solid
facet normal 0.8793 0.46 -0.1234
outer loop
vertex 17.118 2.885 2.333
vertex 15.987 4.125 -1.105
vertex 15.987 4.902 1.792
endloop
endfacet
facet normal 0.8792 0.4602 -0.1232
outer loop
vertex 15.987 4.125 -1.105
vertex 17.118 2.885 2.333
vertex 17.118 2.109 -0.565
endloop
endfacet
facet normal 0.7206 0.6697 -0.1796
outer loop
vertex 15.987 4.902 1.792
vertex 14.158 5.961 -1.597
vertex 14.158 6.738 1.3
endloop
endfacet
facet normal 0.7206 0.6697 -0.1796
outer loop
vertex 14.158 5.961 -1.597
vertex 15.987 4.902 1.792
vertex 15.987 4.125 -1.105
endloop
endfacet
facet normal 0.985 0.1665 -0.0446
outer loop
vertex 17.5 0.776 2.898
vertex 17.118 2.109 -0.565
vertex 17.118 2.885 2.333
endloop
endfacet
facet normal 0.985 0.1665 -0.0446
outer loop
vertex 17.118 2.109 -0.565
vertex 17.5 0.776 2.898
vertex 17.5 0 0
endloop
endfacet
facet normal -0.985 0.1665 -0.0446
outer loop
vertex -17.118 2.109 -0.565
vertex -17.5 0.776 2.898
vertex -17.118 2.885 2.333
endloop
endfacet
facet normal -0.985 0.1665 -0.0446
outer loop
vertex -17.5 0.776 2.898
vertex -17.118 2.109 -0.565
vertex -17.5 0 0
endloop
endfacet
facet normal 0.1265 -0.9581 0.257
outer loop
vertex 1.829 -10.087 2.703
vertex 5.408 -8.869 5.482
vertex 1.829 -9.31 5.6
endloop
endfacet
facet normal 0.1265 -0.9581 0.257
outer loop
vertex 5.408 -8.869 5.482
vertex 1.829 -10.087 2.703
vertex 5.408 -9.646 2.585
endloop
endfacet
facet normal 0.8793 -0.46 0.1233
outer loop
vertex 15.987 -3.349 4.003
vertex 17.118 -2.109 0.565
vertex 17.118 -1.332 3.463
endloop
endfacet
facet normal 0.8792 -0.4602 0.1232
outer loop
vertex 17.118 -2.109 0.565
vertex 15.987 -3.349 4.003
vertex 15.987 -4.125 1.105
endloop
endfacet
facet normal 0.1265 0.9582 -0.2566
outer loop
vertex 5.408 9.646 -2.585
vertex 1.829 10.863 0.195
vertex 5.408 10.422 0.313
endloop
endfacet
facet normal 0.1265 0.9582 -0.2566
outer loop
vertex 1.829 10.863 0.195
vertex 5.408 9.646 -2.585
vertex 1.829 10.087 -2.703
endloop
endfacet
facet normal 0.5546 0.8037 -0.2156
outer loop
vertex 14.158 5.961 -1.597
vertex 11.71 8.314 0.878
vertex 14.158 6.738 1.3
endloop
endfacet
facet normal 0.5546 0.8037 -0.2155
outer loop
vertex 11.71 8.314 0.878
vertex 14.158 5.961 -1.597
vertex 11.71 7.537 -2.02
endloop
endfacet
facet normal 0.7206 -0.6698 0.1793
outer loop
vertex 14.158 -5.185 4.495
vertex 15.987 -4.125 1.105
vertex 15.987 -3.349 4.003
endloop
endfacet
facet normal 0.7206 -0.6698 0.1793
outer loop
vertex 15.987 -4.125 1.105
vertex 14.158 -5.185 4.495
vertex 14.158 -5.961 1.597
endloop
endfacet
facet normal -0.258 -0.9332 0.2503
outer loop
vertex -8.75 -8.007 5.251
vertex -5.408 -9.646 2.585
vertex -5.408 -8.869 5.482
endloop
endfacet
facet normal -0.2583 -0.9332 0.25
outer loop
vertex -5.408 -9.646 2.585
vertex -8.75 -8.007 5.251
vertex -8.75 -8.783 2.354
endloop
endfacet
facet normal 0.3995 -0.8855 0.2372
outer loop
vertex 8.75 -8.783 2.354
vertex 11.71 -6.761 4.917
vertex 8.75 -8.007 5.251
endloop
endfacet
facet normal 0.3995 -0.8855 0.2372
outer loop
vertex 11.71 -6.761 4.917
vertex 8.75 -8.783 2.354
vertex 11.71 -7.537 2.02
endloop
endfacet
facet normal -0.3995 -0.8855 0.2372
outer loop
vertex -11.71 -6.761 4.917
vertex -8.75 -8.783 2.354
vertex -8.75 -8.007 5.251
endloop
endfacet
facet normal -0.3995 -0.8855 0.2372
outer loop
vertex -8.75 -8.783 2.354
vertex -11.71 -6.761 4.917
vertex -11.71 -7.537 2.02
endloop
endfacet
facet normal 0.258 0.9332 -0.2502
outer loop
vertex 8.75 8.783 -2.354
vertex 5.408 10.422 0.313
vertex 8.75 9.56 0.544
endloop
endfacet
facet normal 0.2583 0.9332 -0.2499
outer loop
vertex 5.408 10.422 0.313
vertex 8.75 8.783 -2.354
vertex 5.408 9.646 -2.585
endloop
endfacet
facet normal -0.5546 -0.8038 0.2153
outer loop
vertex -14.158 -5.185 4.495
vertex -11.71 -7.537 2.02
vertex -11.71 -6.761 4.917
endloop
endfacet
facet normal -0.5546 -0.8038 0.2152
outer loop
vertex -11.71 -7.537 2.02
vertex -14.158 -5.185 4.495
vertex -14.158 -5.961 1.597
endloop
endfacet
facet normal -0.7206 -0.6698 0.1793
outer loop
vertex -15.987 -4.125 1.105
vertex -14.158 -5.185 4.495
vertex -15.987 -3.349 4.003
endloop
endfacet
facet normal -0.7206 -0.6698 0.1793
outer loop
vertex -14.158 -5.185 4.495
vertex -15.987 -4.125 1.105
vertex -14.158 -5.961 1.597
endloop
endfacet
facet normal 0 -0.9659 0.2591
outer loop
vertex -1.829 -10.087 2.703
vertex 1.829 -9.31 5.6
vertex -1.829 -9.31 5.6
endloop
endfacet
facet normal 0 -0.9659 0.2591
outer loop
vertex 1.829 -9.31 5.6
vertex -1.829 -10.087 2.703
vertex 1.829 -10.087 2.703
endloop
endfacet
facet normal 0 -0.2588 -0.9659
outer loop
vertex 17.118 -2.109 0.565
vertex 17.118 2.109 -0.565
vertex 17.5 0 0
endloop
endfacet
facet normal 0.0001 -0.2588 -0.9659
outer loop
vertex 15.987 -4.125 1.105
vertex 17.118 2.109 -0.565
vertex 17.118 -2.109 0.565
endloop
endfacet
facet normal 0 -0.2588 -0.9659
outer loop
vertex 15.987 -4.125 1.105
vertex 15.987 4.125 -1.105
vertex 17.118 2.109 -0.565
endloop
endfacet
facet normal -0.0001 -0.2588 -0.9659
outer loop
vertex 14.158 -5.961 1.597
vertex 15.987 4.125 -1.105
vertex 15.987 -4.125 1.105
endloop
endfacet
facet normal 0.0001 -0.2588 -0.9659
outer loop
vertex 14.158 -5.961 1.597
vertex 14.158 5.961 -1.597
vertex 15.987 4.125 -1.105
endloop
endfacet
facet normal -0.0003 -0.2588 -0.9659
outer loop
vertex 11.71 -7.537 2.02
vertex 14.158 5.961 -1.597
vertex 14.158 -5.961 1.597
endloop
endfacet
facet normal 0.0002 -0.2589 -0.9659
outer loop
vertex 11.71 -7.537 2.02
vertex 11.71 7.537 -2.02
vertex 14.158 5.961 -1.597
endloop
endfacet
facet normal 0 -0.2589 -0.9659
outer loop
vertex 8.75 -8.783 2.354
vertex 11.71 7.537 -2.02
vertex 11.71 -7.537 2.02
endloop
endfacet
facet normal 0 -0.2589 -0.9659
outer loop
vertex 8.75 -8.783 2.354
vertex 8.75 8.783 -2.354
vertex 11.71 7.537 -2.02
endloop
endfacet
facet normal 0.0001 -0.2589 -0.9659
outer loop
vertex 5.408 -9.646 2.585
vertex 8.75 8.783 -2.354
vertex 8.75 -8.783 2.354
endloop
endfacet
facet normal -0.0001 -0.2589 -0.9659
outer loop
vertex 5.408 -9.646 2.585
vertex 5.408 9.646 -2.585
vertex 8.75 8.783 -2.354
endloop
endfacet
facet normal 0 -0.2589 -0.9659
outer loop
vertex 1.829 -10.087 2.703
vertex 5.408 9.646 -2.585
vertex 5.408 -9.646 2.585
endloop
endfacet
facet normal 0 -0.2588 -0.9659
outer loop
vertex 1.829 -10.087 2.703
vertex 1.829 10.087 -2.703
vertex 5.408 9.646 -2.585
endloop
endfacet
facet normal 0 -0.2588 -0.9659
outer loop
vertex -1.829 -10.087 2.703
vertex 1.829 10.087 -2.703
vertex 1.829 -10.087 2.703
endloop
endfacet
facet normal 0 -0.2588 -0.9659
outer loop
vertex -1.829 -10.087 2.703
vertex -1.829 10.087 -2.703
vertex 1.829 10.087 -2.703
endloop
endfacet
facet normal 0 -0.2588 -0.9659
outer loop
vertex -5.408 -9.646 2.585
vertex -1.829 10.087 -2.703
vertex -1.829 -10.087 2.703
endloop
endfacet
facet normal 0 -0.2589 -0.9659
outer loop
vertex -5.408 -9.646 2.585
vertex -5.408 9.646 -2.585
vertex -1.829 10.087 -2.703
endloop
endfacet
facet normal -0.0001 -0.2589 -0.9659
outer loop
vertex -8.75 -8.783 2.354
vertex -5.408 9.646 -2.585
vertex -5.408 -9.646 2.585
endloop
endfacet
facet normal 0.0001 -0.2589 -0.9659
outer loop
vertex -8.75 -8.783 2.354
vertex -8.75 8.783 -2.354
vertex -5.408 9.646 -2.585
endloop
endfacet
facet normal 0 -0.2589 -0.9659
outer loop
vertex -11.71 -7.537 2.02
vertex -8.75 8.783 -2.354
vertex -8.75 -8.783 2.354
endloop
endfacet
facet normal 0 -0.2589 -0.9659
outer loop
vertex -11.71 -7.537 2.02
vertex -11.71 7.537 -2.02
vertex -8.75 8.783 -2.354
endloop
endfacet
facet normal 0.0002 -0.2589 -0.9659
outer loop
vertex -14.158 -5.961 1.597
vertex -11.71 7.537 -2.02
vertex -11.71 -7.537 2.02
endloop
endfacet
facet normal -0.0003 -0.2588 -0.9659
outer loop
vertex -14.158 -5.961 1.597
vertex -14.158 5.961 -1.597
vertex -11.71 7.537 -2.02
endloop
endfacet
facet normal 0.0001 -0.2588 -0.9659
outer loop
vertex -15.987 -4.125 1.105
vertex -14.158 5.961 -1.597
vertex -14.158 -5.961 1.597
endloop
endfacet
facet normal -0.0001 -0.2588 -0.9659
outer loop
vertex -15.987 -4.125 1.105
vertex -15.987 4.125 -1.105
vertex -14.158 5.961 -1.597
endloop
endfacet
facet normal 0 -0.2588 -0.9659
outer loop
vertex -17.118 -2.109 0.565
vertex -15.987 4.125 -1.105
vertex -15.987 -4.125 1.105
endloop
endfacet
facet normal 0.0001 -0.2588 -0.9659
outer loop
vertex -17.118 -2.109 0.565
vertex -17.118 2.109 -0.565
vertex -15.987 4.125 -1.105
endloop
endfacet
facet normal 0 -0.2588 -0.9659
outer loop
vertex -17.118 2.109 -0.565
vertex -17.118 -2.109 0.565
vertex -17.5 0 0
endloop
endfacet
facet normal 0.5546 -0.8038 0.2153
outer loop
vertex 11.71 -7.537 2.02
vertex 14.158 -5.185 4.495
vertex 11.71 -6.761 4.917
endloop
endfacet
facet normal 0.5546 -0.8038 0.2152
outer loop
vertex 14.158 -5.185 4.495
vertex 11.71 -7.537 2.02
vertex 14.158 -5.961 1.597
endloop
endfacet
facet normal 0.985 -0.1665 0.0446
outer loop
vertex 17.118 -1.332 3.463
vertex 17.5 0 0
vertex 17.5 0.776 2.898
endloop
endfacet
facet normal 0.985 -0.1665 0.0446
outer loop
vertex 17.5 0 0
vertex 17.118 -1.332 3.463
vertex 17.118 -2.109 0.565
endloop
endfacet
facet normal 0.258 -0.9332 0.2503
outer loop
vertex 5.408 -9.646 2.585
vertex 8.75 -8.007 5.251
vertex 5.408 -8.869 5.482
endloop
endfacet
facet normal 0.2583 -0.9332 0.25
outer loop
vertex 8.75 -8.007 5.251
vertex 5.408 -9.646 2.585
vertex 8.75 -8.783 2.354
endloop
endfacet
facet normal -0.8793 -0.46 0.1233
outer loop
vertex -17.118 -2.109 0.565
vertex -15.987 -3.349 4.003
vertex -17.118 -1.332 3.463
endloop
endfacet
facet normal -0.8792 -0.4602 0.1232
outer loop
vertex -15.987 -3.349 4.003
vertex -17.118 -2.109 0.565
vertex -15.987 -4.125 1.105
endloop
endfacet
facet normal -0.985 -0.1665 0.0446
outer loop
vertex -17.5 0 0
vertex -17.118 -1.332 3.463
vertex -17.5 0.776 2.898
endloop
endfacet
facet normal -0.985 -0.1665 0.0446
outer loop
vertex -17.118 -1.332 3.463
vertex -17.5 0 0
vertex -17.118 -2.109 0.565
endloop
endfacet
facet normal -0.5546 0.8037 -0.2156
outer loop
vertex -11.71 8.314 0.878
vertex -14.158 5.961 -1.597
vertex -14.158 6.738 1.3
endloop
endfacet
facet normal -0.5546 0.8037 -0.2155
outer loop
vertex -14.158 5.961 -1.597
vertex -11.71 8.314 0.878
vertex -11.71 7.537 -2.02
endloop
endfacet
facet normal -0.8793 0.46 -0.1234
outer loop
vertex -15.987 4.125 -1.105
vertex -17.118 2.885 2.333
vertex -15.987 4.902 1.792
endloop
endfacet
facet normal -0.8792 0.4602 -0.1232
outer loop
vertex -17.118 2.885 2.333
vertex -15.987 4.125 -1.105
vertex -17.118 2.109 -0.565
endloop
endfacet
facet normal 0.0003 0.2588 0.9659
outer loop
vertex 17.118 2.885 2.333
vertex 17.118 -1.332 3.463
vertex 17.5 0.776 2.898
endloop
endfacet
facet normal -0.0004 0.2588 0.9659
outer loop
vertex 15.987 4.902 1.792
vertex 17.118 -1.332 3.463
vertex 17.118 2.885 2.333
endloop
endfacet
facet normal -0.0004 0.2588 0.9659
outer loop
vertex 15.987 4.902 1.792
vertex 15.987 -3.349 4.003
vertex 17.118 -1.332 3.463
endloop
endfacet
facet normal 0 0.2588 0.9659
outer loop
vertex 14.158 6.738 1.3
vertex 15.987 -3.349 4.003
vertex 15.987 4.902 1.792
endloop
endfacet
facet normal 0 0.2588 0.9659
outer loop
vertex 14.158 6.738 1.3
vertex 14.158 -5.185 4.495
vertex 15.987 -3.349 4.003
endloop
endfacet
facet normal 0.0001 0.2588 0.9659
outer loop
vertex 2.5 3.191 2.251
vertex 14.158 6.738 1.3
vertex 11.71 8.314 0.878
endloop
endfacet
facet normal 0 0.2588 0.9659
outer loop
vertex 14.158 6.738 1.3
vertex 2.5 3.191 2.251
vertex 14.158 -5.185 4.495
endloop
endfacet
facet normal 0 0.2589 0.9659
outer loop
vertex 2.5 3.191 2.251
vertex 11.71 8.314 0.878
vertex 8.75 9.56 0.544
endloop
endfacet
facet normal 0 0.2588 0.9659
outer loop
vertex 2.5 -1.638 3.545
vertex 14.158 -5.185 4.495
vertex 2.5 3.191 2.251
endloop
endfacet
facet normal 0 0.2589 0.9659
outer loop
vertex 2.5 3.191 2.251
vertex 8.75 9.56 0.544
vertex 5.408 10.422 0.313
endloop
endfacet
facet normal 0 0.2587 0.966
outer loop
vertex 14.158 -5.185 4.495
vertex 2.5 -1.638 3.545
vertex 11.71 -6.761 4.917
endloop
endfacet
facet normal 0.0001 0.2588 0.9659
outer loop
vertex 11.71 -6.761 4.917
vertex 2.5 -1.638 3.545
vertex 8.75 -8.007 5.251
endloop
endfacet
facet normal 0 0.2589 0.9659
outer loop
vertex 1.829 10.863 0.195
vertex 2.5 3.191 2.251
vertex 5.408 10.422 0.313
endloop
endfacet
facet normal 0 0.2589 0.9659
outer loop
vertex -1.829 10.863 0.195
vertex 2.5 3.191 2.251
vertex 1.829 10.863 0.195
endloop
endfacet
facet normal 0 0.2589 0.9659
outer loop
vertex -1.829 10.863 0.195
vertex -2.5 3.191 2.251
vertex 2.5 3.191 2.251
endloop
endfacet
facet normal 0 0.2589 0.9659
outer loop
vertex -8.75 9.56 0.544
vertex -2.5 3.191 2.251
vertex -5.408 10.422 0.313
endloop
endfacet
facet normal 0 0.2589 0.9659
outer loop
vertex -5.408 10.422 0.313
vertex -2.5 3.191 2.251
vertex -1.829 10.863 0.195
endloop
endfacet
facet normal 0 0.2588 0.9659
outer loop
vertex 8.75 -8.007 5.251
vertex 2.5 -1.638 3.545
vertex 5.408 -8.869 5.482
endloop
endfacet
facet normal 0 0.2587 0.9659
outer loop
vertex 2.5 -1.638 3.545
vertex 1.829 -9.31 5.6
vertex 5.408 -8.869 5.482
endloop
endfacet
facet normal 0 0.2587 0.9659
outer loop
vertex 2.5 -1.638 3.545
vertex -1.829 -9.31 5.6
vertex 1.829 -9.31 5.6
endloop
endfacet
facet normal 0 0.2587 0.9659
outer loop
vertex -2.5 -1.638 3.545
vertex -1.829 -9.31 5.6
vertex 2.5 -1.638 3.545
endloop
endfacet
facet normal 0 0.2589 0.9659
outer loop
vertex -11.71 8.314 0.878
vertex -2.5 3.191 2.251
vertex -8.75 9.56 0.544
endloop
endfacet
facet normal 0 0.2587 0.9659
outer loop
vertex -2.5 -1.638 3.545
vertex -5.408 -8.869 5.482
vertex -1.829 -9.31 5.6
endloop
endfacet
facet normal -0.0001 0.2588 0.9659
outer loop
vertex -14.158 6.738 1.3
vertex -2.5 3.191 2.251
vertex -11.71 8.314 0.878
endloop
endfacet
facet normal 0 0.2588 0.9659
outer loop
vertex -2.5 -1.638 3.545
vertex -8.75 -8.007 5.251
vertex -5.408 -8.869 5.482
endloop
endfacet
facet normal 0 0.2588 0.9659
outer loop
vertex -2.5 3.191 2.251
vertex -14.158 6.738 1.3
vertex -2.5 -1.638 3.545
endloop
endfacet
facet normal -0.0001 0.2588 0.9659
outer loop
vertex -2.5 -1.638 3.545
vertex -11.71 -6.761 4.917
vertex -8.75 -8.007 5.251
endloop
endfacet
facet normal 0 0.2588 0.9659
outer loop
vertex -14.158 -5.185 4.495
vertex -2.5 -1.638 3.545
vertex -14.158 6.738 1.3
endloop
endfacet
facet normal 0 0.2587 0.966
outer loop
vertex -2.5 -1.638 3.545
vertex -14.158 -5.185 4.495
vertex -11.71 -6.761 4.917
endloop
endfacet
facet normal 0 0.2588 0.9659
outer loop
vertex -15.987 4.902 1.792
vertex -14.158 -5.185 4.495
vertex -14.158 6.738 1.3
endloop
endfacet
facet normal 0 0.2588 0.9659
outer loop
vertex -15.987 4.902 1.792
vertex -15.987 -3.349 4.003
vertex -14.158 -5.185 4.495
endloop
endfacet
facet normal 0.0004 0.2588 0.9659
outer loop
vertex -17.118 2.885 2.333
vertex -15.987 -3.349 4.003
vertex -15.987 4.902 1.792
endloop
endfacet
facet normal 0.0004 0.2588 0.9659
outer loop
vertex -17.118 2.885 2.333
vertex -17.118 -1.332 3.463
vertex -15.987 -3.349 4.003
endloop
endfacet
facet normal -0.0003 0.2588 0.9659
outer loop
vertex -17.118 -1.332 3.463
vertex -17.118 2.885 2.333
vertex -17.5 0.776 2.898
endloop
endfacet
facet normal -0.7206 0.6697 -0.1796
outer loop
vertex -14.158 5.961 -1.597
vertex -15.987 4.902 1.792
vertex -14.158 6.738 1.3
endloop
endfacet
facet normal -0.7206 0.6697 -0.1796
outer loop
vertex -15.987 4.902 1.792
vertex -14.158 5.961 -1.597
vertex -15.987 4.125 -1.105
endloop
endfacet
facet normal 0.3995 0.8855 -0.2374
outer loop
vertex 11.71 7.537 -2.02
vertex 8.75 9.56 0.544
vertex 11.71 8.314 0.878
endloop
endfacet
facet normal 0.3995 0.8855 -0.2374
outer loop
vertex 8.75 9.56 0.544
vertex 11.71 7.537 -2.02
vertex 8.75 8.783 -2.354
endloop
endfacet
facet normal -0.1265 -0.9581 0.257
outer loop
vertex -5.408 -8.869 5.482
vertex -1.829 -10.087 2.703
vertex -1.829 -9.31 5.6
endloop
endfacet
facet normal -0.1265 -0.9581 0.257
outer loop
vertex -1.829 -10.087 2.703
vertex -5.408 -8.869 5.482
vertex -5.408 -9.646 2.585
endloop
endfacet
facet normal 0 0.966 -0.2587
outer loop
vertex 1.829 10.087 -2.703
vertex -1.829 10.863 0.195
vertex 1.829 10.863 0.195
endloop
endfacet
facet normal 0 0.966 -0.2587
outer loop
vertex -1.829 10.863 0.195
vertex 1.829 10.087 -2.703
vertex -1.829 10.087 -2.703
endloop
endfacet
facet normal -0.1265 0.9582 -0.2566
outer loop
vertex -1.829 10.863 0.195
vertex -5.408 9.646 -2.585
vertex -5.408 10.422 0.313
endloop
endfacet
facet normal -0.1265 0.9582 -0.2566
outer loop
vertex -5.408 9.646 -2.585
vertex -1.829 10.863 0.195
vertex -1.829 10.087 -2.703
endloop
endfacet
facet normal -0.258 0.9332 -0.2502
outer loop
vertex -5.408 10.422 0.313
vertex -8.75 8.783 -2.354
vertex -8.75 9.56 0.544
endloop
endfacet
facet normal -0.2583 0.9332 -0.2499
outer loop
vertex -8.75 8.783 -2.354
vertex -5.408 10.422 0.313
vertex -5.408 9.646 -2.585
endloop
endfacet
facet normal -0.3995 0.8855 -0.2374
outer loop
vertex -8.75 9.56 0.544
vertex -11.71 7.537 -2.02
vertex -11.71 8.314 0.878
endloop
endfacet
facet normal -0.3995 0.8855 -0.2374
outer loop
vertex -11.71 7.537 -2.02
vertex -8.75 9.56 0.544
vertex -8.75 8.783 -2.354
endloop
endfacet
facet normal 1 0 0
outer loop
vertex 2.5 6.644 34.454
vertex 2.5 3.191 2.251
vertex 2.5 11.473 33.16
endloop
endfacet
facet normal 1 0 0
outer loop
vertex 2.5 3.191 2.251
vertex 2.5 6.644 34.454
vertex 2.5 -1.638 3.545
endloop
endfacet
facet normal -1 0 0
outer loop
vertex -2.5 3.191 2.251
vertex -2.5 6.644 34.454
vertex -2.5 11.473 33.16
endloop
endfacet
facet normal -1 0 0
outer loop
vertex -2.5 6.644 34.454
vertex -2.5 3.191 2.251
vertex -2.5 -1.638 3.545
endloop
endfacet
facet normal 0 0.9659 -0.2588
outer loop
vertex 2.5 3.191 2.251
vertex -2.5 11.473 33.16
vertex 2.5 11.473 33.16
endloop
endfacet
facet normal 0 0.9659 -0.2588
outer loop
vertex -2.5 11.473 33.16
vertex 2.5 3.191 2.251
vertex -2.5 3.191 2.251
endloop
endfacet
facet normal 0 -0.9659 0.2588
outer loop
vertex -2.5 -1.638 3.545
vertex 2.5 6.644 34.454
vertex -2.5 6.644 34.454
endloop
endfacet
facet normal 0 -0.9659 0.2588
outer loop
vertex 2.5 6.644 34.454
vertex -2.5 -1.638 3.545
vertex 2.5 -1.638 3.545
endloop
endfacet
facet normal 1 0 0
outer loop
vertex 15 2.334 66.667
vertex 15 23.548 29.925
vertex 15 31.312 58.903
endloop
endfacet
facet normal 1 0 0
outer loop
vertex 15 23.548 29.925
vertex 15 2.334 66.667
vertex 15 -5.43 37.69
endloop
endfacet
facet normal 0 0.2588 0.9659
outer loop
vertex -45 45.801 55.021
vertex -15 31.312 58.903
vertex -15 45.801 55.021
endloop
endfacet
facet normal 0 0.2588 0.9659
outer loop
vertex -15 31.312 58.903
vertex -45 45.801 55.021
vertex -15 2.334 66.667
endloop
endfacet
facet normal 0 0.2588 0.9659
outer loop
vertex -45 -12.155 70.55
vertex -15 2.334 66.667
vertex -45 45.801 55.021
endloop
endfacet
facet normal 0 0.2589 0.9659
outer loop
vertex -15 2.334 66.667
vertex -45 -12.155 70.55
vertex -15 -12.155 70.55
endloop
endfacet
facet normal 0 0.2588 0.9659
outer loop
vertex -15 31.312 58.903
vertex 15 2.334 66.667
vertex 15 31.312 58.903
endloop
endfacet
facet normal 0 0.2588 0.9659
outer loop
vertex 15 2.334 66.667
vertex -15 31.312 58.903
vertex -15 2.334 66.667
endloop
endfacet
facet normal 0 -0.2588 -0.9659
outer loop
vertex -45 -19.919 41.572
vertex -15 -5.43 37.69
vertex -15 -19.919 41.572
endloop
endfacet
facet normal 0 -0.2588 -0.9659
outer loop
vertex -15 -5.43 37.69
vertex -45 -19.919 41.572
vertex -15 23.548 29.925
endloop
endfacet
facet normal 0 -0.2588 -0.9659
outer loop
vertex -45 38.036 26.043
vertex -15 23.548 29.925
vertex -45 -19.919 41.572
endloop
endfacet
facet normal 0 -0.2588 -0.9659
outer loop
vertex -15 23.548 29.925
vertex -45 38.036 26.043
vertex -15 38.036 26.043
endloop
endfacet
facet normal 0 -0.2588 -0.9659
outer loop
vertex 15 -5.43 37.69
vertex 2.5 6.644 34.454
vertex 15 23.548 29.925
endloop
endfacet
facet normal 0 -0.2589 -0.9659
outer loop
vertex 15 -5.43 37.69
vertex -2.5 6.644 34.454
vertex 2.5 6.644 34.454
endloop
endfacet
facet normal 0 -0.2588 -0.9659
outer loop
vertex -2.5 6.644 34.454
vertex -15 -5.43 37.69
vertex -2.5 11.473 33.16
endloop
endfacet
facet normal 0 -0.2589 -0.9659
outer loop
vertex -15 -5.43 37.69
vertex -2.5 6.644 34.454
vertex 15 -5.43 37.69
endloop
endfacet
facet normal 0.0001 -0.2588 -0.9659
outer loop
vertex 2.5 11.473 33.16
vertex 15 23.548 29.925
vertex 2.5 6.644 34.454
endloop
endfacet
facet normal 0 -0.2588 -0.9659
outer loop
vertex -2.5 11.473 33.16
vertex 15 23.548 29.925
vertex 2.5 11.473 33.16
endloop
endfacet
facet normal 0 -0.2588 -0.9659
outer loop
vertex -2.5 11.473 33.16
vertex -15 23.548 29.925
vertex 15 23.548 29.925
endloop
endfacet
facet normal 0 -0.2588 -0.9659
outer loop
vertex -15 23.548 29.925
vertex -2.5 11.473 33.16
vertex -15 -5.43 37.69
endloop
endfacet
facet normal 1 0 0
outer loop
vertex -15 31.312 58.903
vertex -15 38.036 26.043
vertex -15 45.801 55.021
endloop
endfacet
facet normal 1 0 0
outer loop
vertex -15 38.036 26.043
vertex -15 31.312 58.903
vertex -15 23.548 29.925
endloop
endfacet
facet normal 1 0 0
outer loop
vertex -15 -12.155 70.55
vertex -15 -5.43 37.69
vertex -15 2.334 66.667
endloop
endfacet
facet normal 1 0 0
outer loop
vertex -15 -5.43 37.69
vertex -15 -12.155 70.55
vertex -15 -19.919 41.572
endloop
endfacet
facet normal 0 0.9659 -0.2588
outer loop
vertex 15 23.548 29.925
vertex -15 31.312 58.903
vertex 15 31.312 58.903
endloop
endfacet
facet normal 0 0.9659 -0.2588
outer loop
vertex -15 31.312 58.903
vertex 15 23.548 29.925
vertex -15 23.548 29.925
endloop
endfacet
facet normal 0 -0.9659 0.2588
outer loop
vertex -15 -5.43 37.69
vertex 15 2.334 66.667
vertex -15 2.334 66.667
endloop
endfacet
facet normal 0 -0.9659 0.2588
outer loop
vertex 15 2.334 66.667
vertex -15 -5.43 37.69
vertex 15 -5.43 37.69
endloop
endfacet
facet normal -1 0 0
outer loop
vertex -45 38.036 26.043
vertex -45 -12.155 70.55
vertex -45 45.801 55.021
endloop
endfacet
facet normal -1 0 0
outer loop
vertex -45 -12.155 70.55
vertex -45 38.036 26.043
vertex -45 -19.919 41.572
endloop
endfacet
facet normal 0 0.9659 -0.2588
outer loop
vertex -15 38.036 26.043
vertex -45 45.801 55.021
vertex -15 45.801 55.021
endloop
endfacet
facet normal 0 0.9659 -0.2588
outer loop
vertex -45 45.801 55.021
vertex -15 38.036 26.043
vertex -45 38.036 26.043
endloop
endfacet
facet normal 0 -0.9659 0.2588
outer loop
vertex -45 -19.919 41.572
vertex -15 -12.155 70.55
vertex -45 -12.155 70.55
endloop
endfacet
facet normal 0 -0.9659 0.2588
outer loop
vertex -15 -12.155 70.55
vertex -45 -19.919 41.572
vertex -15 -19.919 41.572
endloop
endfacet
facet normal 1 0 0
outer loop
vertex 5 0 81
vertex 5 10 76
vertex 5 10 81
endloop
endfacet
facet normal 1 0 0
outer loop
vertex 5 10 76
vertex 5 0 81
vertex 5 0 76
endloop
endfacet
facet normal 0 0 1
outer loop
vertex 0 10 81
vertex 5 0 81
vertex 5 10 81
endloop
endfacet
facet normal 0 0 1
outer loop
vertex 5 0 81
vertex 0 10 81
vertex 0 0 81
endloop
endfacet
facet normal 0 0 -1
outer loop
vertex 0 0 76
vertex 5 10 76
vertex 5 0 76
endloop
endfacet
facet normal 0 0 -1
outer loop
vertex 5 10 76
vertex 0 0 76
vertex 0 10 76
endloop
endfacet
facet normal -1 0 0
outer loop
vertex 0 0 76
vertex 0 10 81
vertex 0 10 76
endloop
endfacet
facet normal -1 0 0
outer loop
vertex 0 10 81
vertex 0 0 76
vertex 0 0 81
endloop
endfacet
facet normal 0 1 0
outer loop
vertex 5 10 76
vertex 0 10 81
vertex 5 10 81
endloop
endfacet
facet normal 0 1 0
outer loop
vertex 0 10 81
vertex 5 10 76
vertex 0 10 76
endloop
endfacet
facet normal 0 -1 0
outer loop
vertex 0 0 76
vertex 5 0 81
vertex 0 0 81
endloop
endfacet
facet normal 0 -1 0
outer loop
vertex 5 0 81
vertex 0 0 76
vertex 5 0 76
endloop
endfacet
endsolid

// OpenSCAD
rotate([-15,0,0])
union() {
scale([1,0.6,1])
linear_extrude(3)
circle(d=35);
translate([0,0,18])
cube([5,5,35], center=true);
translate([0,0,50])
cube([30,30,30], center=true);
translate([-30,0,50])
cube([30,60,30], center=true);

}
translate([0,0,76])
cube([5,10,5]);
